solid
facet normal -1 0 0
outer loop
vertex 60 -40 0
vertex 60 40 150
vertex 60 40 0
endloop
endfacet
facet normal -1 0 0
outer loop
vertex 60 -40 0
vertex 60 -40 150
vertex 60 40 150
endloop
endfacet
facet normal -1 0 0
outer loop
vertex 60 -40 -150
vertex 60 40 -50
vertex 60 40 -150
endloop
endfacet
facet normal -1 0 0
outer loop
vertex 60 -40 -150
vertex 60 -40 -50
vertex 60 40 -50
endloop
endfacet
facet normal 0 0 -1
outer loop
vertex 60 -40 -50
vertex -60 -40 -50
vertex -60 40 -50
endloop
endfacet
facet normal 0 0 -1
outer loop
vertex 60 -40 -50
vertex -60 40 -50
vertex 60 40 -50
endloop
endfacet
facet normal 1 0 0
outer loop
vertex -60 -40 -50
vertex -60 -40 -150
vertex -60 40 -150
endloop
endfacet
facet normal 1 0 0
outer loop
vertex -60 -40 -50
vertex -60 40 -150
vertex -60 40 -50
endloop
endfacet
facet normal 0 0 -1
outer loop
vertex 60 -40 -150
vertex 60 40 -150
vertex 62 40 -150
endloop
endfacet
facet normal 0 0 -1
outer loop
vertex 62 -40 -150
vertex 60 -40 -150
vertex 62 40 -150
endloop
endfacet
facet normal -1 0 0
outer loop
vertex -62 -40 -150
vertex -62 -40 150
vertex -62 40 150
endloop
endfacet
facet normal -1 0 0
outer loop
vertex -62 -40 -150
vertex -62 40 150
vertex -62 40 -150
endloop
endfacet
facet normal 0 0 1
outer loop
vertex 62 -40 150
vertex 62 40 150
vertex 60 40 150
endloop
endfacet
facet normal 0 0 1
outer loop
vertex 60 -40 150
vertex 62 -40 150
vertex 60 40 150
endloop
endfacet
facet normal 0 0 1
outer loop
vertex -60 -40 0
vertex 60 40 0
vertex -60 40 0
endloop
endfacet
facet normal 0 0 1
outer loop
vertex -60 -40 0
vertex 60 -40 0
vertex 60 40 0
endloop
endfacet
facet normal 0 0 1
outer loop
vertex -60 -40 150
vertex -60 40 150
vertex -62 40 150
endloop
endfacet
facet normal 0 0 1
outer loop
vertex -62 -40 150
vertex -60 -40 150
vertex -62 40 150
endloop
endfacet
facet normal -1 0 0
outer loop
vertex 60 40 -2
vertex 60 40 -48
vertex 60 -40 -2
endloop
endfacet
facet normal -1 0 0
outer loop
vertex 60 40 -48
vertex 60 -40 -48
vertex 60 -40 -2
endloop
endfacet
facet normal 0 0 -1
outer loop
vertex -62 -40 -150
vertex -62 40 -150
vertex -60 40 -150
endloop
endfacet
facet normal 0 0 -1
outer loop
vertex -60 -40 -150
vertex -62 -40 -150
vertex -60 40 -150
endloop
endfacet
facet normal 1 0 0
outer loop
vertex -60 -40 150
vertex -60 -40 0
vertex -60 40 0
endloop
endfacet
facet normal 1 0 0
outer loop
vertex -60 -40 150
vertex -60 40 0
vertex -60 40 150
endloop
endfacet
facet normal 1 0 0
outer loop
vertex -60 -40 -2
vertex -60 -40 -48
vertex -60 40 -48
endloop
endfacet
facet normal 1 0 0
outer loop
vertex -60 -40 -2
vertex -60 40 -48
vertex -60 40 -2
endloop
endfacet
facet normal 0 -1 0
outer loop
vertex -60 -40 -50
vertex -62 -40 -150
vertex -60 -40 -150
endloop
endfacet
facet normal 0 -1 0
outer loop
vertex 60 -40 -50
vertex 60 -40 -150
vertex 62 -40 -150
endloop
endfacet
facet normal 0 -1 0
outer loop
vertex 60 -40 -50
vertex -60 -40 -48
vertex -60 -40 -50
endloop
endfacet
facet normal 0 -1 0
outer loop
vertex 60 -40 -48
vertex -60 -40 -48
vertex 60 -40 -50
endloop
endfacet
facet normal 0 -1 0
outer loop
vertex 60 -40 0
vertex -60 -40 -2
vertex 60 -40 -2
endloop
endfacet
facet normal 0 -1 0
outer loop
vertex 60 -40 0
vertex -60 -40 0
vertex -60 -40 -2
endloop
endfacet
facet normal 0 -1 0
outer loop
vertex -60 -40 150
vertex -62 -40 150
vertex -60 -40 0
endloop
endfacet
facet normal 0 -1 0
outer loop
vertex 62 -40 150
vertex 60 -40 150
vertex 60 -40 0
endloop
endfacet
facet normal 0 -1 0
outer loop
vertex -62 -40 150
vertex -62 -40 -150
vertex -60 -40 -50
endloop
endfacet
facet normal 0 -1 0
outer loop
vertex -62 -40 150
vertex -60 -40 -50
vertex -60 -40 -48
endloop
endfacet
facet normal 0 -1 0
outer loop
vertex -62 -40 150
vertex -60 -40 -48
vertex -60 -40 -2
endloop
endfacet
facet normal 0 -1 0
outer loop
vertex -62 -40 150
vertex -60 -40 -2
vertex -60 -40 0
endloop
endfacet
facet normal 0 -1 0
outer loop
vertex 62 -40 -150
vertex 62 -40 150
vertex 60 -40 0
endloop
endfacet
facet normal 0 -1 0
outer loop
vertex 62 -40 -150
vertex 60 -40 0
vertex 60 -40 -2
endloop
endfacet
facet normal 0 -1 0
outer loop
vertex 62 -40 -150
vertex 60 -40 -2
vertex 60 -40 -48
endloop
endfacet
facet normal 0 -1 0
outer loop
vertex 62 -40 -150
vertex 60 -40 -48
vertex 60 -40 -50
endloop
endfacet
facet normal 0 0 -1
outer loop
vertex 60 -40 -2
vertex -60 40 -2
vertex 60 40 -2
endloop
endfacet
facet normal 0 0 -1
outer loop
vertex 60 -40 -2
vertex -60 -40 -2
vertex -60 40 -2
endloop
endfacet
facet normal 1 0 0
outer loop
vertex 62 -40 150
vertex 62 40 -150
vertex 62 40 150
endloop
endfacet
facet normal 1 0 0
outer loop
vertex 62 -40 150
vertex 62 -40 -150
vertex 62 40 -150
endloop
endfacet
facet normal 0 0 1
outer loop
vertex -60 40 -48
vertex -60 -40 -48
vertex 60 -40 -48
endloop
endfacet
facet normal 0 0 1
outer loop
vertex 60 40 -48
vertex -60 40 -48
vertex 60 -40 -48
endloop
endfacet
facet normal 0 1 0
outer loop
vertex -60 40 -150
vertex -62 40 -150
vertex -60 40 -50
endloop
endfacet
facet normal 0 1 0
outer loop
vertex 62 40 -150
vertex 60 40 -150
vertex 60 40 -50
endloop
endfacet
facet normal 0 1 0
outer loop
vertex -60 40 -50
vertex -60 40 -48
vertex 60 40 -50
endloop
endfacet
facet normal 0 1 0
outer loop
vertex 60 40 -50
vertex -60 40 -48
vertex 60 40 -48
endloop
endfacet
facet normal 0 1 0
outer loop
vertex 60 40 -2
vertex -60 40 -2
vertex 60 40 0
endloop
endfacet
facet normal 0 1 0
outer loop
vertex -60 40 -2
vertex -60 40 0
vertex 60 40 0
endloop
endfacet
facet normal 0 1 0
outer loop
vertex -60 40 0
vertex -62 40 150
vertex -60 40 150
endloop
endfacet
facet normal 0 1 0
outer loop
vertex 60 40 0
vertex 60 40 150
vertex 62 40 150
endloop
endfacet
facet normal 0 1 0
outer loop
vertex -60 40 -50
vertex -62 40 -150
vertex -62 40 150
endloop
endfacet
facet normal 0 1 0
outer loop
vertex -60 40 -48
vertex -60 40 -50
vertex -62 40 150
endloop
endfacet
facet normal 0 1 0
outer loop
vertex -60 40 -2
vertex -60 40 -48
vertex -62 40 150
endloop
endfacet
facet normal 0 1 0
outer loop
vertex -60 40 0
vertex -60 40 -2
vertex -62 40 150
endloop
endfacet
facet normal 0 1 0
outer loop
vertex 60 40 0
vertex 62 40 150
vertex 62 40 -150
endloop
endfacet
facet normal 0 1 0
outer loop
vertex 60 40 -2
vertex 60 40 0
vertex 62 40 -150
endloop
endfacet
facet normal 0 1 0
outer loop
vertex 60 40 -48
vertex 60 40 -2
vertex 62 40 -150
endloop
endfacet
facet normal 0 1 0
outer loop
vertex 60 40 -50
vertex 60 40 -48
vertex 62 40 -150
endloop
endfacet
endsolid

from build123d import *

# Parameters (mm, degrees)
F0_W     = 120
F0_H     = 46
F1_DEPTH = 40


with BuildPart() as f1:
    # F0 (on Front) → F1 (new body, symmetric)
    with BuildSketch(Plane.XZ):
        Polygon((60, 0), (-60, 0), (-60, 150), (-62, 150), (-62, -150), (-60, -150), (-60, -50), (60, -50), (60, -150), (62, -150), (62, 150), (60, 150), align=None)
        with Locations((0, -25)):
            Rectangle(F0_W, F0_H, mode=Mode.SUBTRACT)
    extrude(amount=F1_DEPTH, both=True)


solid = f1.part
